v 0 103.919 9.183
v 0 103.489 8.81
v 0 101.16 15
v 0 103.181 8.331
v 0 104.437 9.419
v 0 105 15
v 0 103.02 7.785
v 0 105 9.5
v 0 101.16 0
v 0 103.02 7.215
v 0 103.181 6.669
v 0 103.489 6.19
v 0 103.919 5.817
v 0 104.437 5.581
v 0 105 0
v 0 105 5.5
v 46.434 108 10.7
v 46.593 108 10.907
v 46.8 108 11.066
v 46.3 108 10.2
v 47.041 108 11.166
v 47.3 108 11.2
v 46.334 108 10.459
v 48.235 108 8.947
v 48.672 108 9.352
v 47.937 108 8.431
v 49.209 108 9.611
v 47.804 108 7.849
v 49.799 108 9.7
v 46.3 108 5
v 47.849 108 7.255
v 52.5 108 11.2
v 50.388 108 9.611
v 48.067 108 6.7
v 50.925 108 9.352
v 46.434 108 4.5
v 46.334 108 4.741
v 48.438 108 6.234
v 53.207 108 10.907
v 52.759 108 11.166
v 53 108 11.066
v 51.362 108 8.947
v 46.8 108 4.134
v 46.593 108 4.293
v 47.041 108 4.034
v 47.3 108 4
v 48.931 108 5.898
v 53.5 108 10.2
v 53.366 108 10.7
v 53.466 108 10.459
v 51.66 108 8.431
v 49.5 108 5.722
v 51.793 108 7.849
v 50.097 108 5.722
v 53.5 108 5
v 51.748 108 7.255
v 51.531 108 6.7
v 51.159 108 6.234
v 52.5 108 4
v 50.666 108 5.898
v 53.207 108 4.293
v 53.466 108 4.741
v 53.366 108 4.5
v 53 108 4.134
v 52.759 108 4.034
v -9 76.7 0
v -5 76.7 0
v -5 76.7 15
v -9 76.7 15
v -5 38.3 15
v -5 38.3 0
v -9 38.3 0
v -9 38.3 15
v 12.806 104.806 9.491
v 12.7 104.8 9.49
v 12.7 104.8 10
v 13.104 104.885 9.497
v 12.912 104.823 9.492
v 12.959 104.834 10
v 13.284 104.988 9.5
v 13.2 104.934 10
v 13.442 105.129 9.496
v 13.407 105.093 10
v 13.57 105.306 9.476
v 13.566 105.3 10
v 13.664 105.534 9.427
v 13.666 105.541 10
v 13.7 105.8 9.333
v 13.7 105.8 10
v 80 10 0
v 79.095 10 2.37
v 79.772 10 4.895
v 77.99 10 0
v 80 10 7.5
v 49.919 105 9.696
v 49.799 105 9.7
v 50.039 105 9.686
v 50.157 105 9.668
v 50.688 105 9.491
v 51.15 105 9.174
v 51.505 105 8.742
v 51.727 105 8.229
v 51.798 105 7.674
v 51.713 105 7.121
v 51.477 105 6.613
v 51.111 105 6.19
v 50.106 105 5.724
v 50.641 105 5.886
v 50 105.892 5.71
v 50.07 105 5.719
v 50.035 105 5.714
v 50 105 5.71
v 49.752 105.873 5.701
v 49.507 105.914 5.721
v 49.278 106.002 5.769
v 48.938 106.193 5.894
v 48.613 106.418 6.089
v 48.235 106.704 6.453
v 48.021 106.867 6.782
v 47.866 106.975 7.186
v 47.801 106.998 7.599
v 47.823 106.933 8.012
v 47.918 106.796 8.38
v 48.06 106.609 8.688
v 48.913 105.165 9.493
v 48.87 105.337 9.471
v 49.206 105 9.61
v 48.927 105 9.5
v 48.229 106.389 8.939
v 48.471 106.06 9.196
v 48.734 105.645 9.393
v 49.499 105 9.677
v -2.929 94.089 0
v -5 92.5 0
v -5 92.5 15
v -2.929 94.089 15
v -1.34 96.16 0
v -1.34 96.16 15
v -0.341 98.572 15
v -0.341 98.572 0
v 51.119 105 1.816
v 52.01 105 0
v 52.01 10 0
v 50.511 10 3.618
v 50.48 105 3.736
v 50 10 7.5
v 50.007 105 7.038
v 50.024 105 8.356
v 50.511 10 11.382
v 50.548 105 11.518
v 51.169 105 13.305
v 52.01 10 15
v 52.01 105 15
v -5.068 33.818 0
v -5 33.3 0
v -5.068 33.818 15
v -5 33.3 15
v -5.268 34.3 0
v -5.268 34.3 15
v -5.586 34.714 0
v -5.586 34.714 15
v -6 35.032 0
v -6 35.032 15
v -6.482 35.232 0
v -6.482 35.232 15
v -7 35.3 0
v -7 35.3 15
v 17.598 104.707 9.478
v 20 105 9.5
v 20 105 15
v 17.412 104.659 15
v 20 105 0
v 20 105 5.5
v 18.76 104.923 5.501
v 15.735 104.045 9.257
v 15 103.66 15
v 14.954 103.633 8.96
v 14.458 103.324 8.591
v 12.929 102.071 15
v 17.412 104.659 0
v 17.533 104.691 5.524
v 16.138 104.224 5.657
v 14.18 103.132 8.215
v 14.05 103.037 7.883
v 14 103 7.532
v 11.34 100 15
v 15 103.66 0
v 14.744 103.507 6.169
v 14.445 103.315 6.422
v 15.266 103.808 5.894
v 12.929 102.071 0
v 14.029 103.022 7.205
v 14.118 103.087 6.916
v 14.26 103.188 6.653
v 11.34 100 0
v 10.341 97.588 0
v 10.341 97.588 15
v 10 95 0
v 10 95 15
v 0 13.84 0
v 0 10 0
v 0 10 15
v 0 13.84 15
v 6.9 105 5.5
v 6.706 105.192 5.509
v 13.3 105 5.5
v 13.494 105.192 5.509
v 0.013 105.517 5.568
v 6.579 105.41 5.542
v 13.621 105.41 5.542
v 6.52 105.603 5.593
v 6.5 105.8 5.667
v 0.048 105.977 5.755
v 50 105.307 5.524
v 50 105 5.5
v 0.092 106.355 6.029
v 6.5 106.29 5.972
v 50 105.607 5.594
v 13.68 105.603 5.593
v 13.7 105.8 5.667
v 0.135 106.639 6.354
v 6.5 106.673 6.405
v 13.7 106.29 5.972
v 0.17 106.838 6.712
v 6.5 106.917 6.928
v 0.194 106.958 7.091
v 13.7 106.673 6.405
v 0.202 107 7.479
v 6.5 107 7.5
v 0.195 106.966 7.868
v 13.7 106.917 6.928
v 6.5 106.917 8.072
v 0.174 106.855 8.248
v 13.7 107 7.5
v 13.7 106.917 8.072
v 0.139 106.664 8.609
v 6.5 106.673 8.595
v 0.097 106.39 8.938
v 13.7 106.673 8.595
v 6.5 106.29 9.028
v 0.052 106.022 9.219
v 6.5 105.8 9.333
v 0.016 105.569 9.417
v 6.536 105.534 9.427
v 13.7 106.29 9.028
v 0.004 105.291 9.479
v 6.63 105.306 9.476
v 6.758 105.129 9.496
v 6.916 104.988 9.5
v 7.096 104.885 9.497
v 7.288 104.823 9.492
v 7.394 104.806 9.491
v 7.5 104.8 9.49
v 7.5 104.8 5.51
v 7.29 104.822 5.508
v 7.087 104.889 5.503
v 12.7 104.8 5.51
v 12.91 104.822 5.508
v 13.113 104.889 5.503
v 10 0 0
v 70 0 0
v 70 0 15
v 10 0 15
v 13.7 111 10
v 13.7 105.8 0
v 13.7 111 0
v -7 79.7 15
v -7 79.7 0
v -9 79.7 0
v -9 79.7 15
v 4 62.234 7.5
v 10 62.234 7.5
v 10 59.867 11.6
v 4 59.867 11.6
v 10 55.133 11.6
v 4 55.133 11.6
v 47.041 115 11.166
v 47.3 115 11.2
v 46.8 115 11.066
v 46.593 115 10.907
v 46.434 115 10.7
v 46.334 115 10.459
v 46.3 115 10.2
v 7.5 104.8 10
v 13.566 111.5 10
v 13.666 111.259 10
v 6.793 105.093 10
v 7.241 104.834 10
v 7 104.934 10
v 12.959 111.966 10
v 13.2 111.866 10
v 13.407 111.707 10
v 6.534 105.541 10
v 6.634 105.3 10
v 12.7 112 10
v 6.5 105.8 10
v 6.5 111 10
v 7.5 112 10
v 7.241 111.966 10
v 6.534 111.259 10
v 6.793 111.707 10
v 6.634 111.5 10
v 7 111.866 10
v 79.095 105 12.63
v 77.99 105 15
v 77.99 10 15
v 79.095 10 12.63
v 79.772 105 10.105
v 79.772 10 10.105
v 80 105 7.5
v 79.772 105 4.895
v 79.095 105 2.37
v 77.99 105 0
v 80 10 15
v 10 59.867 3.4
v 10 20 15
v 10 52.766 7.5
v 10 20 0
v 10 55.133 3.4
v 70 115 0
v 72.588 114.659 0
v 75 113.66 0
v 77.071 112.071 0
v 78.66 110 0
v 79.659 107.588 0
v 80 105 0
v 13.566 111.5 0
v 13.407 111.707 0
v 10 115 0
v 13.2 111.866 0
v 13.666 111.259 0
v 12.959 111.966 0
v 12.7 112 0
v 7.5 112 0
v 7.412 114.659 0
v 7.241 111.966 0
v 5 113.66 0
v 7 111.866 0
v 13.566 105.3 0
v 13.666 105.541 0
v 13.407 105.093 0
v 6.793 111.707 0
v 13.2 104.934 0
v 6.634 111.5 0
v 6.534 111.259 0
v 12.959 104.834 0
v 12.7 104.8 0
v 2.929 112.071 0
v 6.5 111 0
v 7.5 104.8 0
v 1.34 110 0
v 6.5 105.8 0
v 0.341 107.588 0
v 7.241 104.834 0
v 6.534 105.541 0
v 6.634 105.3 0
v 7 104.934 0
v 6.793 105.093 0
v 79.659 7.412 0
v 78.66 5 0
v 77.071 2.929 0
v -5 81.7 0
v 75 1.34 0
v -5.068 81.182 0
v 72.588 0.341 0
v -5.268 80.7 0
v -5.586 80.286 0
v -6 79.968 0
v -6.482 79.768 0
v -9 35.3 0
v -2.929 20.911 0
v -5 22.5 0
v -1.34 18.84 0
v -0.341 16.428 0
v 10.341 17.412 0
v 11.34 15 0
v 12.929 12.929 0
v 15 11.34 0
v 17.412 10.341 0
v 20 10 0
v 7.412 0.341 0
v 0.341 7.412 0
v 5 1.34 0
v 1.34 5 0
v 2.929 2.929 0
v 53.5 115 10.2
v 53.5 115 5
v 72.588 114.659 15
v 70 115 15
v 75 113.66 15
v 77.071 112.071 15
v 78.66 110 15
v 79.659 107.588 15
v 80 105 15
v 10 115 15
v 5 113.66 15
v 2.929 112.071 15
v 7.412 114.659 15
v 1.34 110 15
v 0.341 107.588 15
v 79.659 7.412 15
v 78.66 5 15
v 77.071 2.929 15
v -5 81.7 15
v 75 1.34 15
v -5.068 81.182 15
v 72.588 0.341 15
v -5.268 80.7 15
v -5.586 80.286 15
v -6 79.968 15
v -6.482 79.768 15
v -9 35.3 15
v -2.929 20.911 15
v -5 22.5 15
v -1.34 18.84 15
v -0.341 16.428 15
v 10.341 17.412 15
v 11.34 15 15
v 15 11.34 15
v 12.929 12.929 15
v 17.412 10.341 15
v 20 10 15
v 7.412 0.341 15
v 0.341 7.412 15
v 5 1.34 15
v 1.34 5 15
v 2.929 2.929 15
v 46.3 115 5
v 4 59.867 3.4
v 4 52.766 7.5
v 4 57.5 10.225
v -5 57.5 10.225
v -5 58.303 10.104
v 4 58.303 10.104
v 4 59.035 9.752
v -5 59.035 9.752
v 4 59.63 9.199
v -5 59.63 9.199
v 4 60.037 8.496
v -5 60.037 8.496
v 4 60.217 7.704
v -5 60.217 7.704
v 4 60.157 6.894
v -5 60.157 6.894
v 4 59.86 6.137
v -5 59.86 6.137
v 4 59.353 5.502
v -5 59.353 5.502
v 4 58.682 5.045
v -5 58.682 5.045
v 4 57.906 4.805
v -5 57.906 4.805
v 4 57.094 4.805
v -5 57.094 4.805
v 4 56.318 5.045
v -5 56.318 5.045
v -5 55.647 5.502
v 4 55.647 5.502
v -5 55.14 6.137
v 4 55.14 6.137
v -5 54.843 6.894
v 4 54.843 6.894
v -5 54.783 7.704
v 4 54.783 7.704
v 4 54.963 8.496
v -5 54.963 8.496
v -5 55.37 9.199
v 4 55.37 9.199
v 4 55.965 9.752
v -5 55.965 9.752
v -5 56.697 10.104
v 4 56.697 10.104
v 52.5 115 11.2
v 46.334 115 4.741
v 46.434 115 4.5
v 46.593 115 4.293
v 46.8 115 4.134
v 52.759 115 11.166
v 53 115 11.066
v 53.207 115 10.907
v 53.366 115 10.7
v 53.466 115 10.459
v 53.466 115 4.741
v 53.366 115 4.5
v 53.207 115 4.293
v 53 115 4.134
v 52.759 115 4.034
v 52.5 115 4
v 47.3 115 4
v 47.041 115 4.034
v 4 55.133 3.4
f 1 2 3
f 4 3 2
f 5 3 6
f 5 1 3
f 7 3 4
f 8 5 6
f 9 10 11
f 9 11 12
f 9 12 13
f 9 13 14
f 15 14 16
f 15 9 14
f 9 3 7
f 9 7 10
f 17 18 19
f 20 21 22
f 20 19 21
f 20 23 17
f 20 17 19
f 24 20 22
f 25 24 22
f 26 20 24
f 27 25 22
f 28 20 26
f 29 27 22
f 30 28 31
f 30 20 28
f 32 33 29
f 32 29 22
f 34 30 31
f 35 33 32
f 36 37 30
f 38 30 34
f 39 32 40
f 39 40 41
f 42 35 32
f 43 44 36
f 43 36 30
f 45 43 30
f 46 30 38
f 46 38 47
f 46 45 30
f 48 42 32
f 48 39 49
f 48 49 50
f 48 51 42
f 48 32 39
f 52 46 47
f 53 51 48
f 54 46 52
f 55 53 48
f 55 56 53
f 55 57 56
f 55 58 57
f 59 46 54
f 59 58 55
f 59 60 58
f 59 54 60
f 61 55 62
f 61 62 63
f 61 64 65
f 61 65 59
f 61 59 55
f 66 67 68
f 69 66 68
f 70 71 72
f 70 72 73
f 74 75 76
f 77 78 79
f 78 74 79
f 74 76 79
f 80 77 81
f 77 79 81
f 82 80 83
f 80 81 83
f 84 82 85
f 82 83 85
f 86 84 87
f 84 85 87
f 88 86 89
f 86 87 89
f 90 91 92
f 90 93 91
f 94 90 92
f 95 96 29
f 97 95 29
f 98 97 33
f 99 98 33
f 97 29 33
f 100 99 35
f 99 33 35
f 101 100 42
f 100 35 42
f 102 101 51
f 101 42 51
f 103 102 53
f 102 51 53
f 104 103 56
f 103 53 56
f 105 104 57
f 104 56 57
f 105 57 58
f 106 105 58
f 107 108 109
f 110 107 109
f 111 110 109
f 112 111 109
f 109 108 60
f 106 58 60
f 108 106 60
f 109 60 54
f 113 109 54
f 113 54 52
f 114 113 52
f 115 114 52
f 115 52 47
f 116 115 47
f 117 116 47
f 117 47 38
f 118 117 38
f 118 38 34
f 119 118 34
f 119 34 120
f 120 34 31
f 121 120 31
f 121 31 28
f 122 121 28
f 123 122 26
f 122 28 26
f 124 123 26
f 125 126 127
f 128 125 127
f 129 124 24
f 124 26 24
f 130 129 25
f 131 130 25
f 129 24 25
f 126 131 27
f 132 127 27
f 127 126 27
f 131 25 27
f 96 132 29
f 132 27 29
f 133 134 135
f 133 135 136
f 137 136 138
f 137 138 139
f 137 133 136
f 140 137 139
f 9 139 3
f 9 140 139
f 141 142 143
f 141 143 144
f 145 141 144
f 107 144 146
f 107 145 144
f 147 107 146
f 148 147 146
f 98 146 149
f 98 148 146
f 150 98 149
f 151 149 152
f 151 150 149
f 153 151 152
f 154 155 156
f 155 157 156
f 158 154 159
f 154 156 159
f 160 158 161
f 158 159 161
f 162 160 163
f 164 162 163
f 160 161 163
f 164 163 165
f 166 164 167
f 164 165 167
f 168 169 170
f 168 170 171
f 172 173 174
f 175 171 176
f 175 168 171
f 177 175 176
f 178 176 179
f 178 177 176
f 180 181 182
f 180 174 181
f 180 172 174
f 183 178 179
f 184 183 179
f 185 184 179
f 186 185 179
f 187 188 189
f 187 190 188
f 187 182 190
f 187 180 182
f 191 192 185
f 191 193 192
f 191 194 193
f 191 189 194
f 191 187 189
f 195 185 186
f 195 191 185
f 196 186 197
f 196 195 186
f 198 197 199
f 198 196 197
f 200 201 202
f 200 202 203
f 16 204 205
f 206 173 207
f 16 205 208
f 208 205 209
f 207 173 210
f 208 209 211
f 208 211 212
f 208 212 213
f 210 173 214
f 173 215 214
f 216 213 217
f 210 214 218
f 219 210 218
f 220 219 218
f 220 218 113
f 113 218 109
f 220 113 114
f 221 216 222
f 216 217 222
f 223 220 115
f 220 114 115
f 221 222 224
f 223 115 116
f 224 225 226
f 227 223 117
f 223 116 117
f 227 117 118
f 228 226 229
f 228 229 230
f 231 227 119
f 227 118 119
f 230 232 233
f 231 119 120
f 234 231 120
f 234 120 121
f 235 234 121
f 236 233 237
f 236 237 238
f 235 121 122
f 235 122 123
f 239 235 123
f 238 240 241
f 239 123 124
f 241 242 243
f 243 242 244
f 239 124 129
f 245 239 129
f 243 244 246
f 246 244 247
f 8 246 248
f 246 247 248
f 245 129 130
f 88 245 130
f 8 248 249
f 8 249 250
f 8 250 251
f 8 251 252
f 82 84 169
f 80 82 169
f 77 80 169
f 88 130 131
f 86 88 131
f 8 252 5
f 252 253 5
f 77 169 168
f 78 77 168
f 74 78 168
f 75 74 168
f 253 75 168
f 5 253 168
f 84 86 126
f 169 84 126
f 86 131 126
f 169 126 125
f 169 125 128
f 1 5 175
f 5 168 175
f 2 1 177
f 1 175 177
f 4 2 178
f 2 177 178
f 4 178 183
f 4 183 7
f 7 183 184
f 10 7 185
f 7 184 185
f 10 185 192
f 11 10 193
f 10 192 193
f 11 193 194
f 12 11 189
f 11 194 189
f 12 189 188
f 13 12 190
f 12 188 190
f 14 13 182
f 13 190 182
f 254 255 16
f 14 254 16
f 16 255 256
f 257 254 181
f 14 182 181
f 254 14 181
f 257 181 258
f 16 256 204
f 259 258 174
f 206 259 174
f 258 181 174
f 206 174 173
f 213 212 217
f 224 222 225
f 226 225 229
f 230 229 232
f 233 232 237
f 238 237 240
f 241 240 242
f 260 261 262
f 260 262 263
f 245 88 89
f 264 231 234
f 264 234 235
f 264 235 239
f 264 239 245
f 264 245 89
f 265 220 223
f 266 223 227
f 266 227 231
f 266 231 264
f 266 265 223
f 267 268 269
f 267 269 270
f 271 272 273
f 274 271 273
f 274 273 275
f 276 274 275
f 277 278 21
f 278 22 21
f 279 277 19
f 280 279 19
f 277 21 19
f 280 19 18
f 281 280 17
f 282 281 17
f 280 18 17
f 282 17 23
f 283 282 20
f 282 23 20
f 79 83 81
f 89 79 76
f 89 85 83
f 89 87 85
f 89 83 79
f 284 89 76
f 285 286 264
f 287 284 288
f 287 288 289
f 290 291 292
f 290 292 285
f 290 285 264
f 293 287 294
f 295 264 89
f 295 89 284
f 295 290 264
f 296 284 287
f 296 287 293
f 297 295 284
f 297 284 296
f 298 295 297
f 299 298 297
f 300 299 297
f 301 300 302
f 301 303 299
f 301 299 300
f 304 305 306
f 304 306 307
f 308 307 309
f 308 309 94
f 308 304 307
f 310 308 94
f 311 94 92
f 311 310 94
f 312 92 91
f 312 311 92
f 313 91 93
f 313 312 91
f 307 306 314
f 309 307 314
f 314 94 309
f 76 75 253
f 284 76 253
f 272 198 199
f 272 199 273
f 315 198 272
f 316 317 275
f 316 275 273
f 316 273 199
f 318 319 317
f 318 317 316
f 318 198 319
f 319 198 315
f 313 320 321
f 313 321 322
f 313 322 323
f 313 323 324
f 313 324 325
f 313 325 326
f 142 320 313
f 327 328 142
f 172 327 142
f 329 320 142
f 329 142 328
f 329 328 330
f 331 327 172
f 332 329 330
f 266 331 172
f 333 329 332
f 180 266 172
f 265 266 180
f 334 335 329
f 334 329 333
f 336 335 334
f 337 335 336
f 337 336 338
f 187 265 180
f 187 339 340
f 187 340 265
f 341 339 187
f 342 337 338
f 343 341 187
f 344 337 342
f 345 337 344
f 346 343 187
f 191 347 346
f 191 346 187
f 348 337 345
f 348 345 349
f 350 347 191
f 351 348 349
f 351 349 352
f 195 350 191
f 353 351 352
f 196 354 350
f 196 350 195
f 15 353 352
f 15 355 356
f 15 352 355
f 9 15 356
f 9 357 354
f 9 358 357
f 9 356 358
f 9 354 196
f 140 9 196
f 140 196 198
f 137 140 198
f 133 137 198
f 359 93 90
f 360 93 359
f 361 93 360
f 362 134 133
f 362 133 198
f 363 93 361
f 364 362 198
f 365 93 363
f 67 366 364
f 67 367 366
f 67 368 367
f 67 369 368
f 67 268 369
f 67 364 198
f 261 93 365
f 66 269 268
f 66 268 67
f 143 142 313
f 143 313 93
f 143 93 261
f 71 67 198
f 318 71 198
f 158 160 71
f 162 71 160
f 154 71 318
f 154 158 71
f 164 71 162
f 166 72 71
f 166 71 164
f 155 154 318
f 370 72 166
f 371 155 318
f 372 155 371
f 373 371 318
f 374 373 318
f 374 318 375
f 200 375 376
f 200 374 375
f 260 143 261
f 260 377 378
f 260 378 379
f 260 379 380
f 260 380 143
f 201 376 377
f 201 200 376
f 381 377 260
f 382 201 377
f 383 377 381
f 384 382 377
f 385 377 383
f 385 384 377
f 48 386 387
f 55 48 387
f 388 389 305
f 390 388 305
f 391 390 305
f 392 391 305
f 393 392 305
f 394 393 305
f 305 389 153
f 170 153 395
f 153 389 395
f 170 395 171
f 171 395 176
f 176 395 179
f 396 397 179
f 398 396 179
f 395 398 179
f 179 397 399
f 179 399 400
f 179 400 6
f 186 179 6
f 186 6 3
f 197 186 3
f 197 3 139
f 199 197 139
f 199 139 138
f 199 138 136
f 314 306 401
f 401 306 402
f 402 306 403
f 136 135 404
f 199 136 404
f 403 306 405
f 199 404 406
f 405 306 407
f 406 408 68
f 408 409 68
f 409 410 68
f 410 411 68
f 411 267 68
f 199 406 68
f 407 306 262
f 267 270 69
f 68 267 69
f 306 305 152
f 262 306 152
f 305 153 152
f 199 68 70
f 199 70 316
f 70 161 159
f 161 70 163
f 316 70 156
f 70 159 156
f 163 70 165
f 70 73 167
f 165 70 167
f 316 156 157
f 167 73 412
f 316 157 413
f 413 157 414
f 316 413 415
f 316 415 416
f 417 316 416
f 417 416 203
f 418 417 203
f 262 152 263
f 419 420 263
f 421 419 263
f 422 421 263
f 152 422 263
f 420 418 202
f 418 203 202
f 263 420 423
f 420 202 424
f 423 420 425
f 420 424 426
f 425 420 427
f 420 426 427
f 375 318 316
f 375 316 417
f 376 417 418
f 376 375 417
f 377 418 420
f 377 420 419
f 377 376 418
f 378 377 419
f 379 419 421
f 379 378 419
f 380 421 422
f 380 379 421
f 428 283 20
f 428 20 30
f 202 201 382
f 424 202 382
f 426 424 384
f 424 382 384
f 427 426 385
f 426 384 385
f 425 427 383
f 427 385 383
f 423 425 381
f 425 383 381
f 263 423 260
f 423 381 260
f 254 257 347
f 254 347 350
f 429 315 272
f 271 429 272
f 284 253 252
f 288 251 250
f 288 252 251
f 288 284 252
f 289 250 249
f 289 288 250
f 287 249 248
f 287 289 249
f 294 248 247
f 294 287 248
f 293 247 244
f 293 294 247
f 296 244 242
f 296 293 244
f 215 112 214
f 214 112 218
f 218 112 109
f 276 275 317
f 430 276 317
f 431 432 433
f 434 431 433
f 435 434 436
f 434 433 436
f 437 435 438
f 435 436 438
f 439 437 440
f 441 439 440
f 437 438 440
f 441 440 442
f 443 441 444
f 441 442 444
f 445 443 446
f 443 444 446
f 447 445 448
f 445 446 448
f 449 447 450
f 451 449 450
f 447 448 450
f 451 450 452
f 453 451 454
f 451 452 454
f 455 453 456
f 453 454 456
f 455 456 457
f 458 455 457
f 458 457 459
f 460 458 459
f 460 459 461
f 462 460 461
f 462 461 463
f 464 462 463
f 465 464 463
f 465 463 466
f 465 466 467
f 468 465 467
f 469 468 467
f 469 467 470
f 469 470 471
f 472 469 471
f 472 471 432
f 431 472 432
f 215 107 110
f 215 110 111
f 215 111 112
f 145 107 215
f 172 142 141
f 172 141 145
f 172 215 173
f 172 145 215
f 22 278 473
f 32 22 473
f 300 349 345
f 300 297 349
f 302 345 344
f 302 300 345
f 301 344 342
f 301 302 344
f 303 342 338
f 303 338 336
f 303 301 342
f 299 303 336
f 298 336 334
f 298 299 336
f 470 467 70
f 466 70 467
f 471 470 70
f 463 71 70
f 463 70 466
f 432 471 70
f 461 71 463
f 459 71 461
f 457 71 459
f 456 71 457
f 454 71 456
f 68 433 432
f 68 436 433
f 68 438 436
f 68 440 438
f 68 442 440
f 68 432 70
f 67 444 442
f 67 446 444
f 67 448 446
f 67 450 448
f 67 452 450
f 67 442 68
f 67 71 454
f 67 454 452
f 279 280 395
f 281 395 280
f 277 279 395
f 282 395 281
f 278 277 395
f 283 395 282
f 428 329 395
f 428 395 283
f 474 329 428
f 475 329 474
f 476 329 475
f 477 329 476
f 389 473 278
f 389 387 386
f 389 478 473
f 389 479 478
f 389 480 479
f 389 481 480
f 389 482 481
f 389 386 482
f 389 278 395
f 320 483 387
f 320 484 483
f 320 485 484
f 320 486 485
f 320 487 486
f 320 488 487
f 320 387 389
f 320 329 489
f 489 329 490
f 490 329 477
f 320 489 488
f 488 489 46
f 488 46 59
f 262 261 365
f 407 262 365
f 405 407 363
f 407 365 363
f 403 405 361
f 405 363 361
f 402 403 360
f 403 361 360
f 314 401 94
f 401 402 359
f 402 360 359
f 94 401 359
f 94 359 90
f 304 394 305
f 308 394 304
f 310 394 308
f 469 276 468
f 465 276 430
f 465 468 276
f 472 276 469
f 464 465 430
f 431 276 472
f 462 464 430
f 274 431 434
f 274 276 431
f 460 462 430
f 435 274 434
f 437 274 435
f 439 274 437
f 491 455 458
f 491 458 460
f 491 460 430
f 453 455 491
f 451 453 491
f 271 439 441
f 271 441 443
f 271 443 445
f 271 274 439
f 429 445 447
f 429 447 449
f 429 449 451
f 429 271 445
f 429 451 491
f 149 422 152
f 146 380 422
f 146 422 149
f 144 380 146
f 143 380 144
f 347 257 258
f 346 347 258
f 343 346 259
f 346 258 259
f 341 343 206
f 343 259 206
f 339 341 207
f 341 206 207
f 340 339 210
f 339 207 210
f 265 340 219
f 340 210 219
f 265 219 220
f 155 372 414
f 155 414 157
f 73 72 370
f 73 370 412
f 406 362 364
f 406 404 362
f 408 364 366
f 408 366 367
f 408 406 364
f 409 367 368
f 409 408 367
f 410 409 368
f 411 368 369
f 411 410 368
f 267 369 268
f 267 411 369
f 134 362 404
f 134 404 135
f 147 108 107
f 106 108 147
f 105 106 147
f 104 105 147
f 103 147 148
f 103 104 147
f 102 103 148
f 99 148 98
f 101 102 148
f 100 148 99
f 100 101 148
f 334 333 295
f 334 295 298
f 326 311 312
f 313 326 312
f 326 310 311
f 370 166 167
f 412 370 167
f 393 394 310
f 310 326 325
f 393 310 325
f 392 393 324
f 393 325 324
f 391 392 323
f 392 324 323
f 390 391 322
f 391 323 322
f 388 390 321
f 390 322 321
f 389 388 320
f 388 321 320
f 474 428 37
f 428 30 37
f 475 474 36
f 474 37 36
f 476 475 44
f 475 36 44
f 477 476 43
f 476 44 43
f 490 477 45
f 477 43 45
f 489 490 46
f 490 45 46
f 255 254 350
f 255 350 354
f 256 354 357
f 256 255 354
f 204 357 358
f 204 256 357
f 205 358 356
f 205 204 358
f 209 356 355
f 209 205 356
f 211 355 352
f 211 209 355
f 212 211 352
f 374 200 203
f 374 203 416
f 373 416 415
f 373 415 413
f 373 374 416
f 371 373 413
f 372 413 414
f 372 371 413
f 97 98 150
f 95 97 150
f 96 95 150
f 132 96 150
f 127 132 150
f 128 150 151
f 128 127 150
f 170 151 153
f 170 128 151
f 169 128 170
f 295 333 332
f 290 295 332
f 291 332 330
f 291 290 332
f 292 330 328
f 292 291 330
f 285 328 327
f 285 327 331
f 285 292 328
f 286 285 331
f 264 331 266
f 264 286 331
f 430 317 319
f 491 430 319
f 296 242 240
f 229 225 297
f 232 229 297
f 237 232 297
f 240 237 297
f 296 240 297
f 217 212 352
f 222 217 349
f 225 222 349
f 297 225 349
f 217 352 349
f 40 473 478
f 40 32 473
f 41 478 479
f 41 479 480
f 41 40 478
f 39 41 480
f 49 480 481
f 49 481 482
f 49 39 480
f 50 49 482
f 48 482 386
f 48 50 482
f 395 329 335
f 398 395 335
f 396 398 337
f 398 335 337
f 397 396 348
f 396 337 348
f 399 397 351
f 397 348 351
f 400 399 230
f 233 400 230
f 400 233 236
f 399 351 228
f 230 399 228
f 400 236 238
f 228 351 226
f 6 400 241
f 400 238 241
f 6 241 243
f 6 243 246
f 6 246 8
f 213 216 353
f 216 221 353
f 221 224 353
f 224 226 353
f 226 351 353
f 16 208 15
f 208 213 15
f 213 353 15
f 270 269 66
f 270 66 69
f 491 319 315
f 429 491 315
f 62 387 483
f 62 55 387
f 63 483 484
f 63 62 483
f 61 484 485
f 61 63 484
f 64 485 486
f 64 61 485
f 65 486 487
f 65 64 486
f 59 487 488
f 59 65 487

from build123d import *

# Parameters (mm, degrees)
MAIN_BODY_DEPTH             = 15
M5_HOLE_REACH               = 145.788
SKETCH2_R                   = 2.725
GRIP_REACH                  = 134.853
SKETCH8_W                   = 7.2
SKETCH8_H                   = 7.2
BUTTON_1_DEPTH              = 7
SKETCH9_R                   = 2
HOLE_WIRES_BUTTON_1_DEPTH   = 3
OUTER_FILLET_R              = 10
SKETCH13_W                  = 7.2
SKETCH13_H                  = 7.2
BUTTON_2_DEPTH              = 10
BUTTONS_FILLET_R            = 1
SKETCH16_R                  = 2
WIRE_ROUTING_DEPTH          = 40
M5_NUT_DEPTH                = 6
SKETCH18_W                  = 15
SKETCH18_H                  = 3
DOVETAIL_MALE_SLOT_DEPTH    = 4
DOVETAIL_MALE_SLOT_FILLET_R = 2


with BuildPart() as part:
    # Model → Main Body (new body)
    with BuildSketch(Plane.XY):
        Polygon((80, 115), (80, 105), (10, 105), (10, 10), (80, 10), (80, 0), (0, 0), (0, 22.5), (-5, 22.5), (-5, 92.5), (0, 92.5), (0, 115), align=None)
    extrude(amount=MAIN_BODY_DEPTH)

    # Sketch2 → M5 Hole (cut, up to next)
    with BuildSketch(Plane.ZY.offset(5), mode=Mode.PRIVATE) as m5_hole_sk1:
        with Locations((7.5, 57.5)):
            Circle(SKETCH2_R)
    m5_hole_tool1 = extrude(m5_hole_sk1.sketch, amount=-M5_HOLE_REACH, mode=Mode.PRIVATE) & part.part
    add(m5_hole_tool1.solids().sort_by_distance((-5, 57.5, 7.5))[0], mode=Mode.SUBTRACT)

    # Sketch6 → Grip (add, up to next)
    with BuildSketch(Plane.XZ.offset(-105), mode=Mode.PRIVATE) as grip_sk1:
        with BuildLine():
            Line((52.009621164, 15), (77.990380713, 15))
            ThreePointArc((77.990380713, 15), (80, 7.5), (77.990380713, 0))
            Line((77.990380713, 0), (52.009621164, 0))
            ThreePointArc((52.009621164, 0), (50.000002221, 7.5), (52.009621164, 15))
        make_face()
    grip_tool1 = extrude(grip_sk1.sketch, amount=GRIP_REACH, mode=Mode.PRIVATE) - part.part
    add(grip_tool1.solids().sort_by_distance((65.000001, 105, 7.5))[0])

    # Sketch8 → Button 1 (cut)
    with BuildSketch(Plane(origin=(0, 115, 0), x_dir=(1, 0, 0), z_dir=(0, 1, 0))):
        with Locations((49.9, -7.6)):
            Rectangle(SKETCH8_W, SKETCH8_H)
    extrude(amount=-BUTTON_1_DEPTH, mode=Mode.SUBTRACT)

    # Sketch9 → Hole Wires Button 1 (cut)
    with BuildSketch(Plane(origin=(0, 108, 0), x_dir=(1, 0, 0), z_dir=(0, 1, 0))):
        with Locations(Location((49.798571137, -7.7, 0), (0, 0, 270))):
            Circle(SKETCH9_R)
    extrude(amount=-HOLE_WIRES_BUTTON_1_DEPTH, mode=Mode.SUBTRACT)

    # Outer Fillet
    # the kernel refuses this fillet: 10 mm, written as the material it adds along each edge
    with BuildSketch(Plane(origin=(0, 22.5, 0), x_dir=(-1, 0, 0), z_dir=(0, 0, 1))) as outer_fillet_piece_1:
        with BuildLine():
            CenterArc((10, 8.660254038), OUTER_FILLET_R, 180, 60)
            Line((0, 8.660254038), (0, 0))
            Line((0, 0), (5, 0))
        make_face()
    extrude(amount=15)
    with BuildSketch(Plane(origin=(10, 10, 0), x_dir=(1, 0, 0), z_dir=(0, 0, 1)), Plane(origin=(10, 105, 0), x_dir=(0, -1, 0), z_dir=(0, 0, 1))) as outer_fillet_piece_2:
        with BuildLine():
            CenterArc((OUTER_FILLET_R, OUTER_FILLET_R), OUTER_FILLET_R, 180, 90)
            Line((0, OUTER_FILLET_R), (0, 0))
            Line((0, 0), (OUTER_FILLET_R, 0))
        make_face()
    extrude(amount=15)
    with BuildSketch(Plane(origin=(0, 92.5, 0), x_dir=(0, 1, 0), z_dir=(0, 0, 1))) as outer_fillet_piece_3:
        with BuildLine():
            CenterArc((8.660254038, 10), OUTER_FILLET_R, 210, 60)
            Line((0, 5), (0, 0))
            Line((0, 0), (8.660254038, 0))
        make_face()
    extrude(amount=15)
    # the kernel refuses this fillet: 10 mm, written as the material it takes off along each edge
    with BuildSketch(Plane(origin=(80, 115, -25), x_dir=(0, -1, 0), z_dir=(0, 0, 1)), Plane(origin=(80, 0, -25), x_dir=(-1, 0, 0), z_dir=(0, 0, 1)), Plane(origin=(0, 0, -25), x_dir=(0, 1, 0), z_dir=(0, 0, 1)), Plane(origin=(0, 115, -25), x_dir=(1, 0, 0), z_dir=(0, 0, 1))) as outer_fillet_2_piece_1:
        with BuildLine():
            CenterArc((OUTER_FILLET_R, -OUTER_FILLET_R), OUTER_FILLET_R, 90, 90)
            Line((0, -OUTER_FILLET_R), (0, 0))
            Line((0, 0), (OUTER_FILLET_R, 0))
        make_face()
    extrude(amount=65, mode=Mode.SUBTRACT)

    # Sketch13 → Button 2 (cut)
    with BuildSketch(Plane(origin=(0, 0, 0), x_dir=(-1, 0, 0), z_dir=(0, 0, -1))):
        with Locations((-10.1, 108.4)):
            Rectangle(SKETCH13_W, SKETCH13_H)
    extrude(amount=-BUTTON_2_DEPTH, mode=Mode.SUBTRACT)

    # Buttons Fillet
    buttons_fillet_edges = [part.edges().sort_by_distance(p)[0] for p in [
        (6.5, 112, 5),
        (6.5, 104.8, 5),
        (13.7, 104.8, 5),
        (13.7, 112, 5),
        (53.5, 111.5, 4),
        (53.5, 111.5, 11.2),
        (46.3, 111.5, 11.2),
        (46.3, 111.5, 4),
    ]]
    fillet(buttons_fillet_edges, radius=BUTTONS_FILLET_R)

    # Sketch16 → Wire Routing (cut, symmetric)
    with BuildSketch(Plane(origin=(10, 0, 0), x_dir=(0, 0, -1), z_dir=(1, 0, 0))):
        with Locations((-7.5, 105)):
            Circle(SKETCH16_R)
    extrude(amount=WIRE_ROUTING_DEPTH, both=True, mode=Mode.SUBTRACT)

    # Sketch17 → M5 Nut (cut)
    with BuildSketch(Plane(origin=(10, 0, 0), x_dir=(0, 0, -1), z_dir=(1, 0, 0))):
        Polygon((-7.5, 62.234272207), (-11.6, 59.867136104), (-11.6, 55.132863896), (-7.5, 52.765727793), (-3.4, 55.132863896), (-3.4, 59.867136104), align=None)
    extrude(amount=-M5_NUT_DEPTH, mode=Mode.SUBTRACT)

    # Sketch18 → Dovetail Male Slot (add)
    with BuildSketch(Plane.ZY.offset(5)):
        with Locations((7.5, 78.2)):
            Rectangle(SKETCH18_W, SKETCH18_H)
        with Locations((7.5, 36.8)):
            Rectangle(SKETCH18_W, SKETCH18_H)
    extrude(amount=DOVETAIL_MALE_SLOT_DEPTH)

    # Dovetail Male Slot Fillet
    dovetail_male_slot_fillet_edges = [part.edges().sort_by_distance(p)[0] for p in [
        (-5, 79.7, 7.5),
        (-5, 35.3, 7.5),
    ]]
    fillet(dovetail_male_slot_fillet_edges, radius=DOVETAIL_MALE_SLOT_FILLET_R)


solid = part.part
